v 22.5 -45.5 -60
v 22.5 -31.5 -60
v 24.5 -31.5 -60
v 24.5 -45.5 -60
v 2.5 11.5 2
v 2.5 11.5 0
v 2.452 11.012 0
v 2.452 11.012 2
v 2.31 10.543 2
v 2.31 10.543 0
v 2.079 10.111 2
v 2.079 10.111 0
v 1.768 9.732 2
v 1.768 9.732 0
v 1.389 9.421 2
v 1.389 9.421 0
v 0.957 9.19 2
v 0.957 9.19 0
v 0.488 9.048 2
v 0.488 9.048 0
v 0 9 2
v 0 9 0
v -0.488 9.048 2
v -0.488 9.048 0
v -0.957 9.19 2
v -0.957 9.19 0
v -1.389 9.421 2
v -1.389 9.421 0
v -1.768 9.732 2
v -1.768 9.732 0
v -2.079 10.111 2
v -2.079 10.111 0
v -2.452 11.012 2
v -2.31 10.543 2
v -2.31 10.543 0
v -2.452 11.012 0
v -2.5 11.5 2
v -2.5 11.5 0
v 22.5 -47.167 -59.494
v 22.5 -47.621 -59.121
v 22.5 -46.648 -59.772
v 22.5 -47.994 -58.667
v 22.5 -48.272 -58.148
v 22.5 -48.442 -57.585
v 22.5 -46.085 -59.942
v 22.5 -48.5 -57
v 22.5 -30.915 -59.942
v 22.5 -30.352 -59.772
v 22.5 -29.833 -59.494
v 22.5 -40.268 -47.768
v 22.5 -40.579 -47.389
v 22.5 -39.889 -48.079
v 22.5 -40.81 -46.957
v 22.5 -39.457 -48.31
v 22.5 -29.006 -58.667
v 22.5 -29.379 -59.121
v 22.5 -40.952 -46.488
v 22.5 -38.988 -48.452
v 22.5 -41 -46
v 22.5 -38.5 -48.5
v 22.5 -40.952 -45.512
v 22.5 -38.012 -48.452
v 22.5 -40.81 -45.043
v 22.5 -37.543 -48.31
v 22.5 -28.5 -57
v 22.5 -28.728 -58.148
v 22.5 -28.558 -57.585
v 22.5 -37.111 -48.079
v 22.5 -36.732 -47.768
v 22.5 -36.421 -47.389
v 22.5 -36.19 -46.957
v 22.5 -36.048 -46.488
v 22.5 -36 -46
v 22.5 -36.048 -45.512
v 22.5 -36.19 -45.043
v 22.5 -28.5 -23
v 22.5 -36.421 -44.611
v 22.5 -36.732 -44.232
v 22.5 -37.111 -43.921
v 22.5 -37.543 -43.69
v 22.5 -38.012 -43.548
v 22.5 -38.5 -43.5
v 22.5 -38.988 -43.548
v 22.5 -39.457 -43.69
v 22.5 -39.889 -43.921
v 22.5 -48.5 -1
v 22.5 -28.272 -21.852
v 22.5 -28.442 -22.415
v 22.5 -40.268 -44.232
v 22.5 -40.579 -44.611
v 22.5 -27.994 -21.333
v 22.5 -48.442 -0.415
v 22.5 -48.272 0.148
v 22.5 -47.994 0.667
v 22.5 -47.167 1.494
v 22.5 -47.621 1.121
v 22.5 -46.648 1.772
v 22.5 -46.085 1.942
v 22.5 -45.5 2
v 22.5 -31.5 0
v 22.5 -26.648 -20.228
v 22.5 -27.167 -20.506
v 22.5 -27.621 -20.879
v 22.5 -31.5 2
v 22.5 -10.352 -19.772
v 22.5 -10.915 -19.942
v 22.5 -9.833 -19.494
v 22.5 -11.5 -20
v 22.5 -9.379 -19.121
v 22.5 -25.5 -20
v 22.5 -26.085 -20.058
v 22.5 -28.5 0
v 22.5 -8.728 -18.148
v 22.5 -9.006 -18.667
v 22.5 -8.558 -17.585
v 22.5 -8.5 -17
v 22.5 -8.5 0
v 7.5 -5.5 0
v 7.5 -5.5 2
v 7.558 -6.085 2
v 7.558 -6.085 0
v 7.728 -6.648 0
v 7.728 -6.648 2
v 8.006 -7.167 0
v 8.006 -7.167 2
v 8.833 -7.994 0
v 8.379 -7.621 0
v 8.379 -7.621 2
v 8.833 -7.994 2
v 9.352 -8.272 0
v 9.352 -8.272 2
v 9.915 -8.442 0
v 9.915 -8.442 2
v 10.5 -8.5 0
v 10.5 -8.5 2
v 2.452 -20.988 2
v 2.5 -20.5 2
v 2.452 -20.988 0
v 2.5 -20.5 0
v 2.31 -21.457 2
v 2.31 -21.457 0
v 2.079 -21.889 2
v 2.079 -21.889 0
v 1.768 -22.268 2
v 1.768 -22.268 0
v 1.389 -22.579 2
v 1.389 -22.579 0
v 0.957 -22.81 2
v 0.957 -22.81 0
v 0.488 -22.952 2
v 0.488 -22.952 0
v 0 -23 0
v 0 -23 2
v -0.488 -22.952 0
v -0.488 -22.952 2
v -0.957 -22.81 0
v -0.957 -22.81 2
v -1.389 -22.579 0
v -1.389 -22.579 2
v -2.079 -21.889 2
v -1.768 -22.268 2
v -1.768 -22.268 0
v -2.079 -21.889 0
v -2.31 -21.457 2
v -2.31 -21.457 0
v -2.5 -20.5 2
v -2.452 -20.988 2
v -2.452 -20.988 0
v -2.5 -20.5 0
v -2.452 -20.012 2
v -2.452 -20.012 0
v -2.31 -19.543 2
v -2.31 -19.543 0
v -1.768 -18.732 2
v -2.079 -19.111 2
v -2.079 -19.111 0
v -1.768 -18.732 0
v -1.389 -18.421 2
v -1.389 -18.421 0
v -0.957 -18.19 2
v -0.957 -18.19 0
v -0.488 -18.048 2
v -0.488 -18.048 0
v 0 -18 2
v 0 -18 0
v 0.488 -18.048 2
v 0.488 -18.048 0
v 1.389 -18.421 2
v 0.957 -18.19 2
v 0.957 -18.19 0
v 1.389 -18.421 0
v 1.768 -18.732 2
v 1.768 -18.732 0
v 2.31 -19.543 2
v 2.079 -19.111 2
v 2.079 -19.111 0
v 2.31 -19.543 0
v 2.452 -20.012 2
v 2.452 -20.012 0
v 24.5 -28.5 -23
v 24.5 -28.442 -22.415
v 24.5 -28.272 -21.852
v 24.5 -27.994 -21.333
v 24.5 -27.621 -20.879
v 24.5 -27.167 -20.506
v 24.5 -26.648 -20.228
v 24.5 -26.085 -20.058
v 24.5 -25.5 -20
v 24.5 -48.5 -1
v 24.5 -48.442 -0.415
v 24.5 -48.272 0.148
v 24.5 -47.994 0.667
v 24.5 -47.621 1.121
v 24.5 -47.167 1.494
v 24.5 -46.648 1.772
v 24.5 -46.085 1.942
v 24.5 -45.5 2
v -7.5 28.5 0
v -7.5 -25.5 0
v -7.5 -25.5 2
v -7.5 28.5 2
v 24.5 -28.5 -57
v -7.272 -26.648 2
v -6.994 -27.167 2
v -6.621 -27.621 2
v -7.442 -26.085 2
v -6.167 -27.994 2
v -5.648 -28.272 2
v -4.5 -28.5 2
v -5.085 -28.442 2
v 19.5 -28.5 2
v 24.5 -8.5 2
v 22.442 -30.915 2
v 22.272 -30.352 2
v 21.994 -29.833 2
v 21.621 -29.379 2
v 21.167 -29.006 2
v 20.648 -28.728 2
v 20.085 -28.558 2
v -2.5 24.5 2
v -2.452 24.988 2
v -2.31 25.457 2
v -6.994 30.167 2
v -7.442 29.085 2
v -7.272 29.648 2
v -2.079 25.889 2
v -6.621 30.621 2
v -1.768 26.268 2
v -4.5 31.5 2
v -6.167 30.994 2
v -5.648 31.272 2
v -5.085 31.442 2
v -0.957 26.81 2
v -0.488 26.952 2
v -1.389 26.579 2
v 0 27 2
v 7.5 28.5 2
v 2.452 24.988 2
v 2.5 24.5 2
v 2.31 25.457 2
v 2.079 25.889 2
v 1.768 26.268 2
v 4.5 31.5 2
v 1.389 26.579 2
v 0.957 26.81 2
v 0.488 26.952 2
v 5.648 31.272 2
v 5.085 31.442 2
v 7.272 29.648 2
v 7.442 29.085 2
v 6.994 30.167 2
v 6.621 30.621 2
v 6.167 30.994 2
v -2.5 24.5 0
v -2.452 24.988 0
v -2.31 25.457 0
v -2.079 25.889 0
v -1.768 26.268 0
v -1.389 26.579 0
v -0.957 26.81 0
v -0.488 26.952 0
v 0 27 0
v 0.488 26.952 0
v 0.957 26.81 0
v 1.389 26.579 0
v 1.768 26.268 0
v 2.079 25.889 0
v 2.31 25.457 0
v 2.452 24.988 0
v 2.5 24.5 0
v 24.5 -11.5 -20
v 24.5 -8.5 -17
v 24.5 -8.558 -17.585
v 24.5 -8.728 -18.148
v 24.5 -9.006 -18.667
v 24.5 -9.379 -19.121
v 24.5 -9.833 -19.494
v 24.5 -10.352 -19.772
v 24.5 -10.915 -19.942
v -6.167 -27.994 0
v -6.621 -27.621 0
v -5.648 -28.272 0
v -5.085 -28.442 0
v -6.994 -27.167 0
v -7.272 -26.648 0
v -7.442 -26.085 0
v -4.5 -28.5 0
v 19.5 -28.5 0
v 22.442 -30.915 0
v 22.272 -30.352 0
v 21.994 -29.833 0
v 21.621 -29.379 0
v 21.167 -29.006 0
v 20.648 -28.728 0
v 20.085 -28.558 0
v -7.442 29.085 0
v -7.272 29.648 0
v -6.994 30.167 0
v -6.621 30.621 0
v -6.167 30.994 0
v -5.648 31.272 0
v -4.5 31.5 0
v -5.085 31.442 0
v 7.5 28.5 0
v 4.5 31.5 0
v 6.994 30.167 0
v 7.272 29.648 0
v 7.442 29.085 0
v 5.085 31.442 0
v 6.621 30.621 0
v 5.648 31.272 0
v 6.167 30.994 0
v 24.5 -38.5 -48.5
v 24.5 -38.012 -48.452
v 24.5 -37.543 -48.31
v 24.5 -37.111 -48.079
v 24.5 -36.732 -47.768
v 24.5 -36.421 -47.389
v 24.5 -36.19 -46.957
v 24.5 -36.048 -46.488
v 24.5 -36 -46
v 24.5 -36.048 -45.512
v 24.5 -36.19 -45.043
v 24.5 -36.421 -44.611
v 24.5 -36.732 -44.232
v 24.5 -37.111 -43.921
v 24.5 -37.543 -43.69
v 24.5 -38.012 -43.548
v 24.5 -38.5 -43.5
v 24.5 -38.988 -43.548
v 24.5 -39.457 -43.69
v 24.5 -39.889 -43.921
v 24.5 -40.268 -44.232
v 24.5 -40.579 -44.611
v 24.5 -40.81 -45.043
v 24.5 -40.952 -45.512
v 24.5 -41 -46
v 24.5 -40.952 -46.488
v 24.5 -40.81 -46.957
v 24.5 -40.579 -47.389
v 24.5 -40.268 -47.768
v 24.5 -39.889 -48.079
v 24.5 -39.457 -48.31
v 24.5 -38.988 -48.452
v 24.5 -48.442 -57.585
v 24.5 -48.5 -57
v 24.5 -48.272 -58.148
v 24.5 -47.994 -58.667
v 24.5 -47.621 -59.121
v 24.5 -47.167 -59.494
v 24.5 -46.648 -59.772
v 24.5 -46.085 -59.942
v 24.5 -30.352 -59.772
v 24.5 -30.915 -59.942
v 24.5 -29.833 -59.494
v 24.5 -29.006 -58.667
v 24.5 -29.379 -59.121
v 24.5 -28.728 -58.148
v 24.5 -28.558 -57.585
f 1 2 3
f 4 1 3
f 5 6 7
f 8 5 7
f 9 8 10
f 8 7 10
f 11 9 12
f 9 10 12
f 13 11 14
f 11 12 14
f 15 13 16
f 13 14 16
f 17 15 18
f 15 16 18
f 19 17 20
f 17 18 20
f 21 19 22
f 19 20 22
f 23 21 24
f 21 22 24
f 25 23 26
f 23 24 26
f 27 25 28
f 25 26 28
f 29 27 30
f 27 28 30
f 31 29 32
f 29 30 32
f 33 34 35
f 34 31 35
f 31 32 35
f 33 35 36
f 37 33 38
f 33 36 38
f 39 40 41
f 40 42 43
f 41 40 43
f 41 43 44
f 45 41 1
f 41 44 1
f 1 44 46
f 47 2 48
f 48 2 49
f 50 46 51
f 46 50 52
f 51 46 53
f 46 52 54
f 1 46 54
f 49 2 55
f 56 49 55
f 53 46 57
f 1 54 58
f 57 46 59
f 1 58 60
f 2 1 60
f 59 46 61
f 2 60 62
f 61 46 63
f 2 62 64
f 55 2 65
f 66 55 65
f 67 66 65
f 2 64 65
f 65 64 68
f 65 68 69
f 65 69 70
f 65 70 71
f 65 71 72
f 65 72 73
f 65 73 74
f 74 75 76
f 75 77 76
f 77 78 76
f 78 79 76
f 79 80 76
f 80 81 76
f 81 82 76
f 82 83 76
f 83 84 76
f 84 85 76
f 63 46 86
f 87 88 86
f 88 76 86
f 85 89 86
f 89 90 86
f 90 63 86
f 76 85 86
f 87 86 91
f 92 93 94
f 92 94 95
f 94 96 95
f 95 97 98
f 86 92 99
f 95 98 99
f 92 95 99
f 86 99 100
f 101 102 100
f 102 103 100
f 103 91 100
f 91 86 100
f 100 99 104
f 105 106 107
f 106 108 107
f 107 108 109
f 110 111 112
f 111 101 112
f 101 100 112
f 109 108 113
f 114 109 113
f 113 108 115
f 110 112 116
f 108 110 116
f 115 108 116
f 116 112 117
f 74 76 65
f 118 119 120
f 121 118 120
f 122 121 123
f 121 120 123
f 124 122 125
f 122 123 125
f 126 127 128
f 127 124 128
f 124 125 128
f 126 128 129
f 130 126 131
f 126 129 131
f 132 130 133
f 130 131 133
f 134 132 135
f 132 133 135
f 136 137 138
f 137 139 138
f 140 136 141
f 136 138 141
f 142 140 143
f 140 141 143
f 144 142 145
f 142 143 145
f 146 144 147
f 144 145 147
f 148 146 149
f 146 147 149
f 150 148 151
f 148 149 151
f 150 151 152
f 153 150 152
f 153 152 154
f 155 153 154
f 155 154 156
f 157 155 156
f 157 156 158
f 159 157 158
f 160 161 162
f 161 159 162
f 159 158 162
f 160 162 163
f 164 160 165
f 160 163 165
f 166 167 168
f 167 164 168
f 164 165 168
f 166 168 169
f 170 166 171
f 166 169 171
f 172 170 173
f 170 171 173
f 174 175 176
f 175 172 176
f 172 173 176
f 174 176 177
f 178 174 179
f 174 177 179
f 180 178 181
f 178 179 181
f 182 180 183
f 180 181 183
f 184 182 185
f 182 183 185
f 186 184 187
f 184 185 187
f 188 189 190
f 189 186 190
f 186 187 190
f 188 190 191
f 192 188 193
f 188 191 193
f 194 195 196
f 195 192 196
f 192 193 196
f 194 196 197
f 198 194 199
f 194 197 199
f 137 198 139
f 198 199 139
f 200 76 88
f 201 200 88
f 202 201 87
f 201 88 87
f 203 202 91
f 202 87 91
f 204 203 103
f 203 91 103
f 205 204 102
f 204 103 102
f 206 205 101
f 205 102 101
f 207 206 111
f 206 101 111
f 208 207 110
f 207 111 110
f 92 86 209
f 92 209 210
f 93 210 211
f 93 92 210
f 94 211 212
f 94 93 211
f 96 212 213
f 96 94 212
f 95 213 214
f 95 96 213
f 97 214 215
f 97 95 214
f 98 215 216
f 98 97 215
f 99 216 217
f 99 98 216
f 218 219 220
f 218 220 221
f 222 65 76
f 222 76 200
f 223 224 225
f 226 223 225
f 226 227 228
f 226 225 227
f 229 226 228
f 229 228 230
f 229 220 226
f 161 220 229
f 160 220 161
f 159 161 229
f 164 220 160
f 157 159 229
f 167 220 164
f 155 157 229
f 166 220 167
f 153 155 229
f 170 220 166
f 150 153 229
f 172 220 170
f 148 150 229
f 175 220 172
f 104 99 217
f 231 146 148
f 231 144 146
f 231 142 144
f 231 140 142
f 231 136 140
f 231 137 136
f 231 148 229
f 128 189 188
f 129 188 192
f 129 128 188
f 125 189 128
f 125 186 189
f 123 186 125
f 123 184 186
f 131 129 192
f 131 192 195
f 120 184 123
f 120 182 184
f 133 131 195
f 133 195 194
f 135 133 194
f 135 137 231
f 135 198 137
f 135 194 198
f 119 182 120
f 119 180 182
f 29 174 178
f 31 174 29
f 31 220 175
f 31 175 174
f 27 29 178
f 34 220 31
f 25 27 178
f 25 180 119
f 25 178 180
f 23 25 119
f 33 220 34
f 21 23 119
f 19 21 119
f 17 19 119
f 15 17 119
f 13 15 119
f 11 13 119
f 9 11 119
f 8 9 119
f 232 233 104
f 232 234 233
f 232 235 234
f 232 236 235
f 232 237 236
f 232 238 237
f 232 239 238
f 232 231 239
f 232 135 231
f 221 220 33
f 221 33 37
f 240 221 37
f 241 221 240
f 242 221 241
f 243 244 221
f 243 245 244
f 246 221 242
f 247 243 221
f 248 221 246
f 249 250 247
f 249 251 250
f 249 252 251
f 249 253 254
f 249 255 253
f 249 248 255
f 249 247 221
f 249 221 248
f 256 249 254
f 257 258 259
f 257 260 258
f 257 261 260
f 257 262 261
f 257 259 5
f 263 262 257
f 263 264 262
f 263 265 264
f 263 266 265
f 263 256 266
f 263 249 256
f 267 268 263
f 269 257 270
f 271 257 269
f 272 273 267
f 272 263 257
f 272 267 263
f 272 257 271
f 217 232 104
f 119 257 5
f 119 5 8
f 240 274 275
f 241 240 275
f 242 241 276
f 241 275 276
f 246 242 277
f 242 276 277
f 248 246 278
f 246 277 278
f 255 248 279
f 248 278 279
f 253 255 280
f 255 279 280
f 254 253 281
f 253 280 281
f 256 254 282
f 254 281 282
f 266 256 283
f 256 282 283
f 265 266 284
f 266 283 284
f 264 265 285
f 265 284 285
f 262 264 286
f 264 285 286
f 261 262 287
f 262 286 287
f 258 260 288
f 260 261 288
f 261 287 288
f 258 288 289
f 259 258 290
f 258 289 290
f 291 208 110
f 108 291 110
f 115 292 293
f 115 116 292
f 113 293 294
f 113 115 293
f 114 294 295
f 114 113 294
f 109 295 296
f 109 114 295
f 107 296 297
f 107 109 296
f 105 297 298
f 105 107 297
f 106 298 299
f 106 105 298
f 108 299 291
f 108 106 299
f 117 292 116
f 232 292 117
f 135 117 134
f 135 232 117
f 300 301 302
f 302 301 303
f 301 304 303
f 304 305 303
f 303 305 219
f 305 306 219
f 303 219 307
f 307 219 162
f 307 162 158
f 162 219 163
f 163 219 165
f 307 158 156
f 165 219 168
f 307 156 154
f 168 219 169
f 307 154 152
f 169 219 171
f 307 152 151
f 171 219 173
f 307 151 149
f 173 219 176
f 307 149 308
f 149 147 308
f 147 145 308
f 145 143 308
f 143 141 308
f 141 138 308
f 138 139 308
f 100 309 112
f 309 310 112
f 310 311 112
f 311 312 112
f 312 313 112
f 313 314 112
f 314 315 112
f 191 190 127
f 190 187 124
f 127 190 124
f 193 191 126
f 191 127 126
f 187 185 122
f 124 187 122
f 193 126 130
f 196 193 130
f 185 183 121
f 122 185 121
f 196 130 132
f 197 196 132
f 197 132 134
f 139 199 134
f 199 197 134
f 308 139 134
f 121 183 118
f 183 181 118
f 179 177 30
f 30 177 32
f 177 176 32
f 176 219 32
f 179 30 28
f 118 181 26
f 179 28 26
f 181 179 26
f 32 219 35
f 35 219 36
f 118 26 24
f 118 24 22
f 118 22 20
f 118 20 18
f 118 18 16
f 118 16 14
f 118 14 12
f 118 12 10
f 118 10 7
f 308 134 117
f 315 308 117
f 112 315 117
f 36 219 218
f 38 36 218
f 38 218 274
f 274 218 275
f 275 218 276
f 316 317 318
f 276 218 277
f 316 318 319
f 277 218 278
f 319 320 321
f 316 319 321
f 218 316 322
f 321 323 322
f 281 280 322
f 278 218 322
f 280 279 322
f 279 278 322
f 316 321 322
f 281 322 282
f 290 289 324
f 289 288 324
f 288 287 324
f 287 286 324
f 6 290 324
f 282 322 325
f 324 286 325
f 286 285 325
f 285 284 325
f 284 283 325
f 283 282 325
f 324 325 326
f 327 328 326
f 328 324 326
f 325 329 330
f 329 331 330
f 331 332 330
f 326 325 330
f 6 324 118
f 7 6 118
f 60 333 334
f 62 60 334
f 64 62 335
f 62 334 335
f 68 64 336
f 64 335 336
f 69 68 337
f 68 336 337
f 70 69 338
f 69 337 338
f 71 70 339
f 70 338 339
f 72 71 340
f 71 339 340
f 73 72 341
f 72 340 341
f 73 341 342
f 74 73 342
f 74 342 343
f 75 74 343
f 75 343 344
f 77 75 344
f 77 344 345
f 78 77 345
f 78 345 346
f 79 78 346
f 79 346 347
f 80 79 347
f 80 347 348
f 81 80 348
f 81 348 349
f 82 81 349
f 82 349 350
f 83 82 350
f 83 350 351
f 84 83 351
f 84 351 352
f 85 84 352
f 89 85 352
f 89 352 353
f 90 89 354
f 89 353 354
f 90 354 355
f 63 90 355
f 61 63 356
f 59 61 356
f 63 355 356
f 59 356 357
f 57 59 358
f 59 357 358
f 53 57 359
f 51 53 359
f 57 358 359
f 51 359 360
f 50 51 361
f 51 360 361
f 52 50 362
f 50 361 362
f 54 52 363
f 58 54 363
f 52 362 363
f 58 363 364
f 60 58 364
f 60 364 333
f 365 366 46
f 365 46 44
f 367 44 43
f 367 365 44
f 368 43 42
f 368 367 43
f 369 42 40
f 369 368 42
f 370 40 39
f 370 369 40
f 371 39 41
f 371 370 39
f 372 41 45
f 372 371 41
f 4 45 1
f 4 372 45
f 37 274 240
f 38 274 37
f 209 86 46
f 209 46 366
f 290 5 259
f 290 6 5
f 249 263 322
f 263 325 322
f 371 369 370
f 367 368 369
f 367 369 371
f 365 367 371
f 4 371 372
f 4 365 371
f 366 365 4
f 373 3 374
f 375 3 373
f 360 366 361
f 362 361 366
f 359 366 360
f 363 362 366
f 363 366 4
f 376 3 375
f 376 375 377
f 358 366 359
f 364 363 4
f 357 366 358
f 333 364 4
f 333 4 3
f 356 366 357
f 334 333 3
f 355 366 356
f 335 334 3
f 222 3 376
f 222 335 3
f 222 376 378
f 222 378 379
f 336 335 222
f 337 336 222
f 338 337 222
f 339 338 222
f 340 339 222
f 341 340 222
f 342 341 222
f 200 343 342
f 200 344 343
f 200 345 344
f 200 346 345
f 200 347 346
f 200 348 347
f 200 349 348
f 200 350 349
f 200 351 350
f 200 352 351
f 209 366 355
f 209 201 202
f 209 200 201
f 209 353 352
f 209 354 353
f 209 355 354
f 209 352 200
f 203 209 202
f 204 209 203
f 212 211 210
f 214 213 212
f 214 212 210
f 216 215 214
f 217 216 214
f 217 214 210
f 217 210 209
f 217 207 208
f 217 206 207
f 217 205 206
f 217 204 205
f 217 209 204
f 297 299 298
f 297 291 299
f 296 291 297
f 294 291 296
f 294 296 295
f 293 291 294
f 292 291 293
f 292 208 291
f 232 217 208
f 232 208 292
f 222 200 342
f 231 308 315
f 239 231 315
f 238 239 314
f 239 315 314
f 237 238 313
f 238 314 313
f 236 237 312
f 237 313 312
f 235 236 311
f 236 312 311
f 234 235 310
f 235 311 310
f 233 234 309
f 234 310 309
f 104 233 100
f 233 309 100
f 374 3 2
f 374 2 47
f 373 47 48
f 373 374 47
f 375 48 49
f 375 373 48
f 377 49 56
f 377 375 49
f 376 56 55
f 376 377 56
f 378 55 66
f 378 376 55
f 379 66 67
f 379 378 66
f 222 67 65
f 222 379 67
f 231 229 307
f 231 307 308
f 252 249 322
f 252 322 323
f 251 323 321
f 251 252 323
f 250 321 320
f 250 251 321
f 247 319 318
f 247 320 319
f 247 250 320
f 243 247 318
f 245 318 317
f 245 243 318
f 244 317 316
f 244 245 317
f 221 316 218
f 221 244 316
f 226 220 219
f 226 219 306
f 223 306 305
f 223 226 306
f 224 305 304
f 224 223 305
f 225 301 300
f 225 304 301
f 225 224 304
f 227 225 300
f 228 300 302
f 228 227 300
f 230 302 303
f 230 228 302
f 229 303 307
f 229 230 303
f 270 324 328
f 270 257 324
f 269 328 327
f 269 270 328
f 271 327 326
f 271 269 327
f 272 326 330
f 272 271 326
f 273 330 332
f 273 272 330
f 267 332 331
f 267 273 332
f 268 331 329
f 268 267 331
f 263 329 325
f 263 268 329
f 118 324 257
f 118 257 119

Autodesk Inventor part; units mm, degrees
ref_plane "YZ Plane" through (0, 0, 0) normal (1, 0, 0) x (0, 1, 0)
ref_plane "XZ Plane" through (0, 0, 0) normal (0, 1, 0) x (-1, 0, 0)
ref_plane "XY Plane" through (0, 0, 0) normal (0, 0, 1) x (1, 0, 0)
sketch "Sketch1" plane through (0, 0, 0) normal (0, 0, 1) x (1, 0, 0)
  line L0 (7.5, -28.5) -> (-7.5, -28.5)
  line L1 (-7.5, -28.5) -> (-7.5, 28.5)
  line L2 (-7.5, 28.5) -> (7.5, -28.5) construction
  line L3 (7.5, 28.5) -> (-7.5, -28.5) construction
  circle A0 centre (0, -20.5) radius 2.5
  line L4 (0, 24.5) -> (0, 11.5) construction
  line L5 (-2.5, 24.5) -> (-2.5, 11.5)
  line L6 (2.5, 11.5) -> (2.5, 24.5)
  arc A1 (2.5, 24.5) -> (-2.5, 24.5) centre (0, 24.5) ccw
  arc A2 (-2.5, 11.5) -> (2.5, 11.5) centre (0, 11.5) ccw
  line L7 (7.5, 31.5) -> (-7.5, 31.5)
  line L8 (-7.5, 31.5) -> (-7.5, -28.5)
  line L9 (7.5, 31.5) -> (7.5, -28.5)
  line L10 (7.5, -8.5) -> (7.5, -28.5)
  line L11 (7.5, -28.5) -> (22.5, -28.5)
  line L12 (22.5, -28.5) -> (22.5, -8.5)
  line L13 (22.5, -8.5) -> (7.5, -8.5)
  line L14 (7.5, -8.5) -> (7.5, -28.5)
  line L15 (22.5, -28.5) -> (24.5, -28.5)
  line L16 (24.5, -28.5) -> (24.5, -8.5)
  line L17 (24.5, -8.5) -> (22.5, -8.5)
  line L18 (22.5, -8.5) -> (22.5, -28.5)
  point P0 (0, 0)
  point P1 (0, 18)
  dimension "d7" = 15
  dimension "d8" = 57
  dimension "d9" = 5
  dimension "d10" = 13
  dimension "d11" = 5
  dimension "d12" = 60
  dimension "d39" = 15
  dimension "d40" = 20
  dimension "d41" = 2
extrude "Extrusion1" add sketch "Sketch1" along normal blind 2 contours L0 L1 L8 L7 L9
extrude "Extrusion2" add sketch "Sketch1" along normal blind 2 contours L9 L13 L12 L11 | L12 L17 L16 L15
extrude "Extrusion8" add sketch "Sketch1" against normal blind 60 contours L12 L17 L16 L15
sketch "Sketch6" plane through (-7.5, -28.5, 0) normal (0, -1, 0) x (1, 0, 0)
  line L0 (32, -60) -> (32, 2) projected
  line L1 (30, 0) -> (30, -60) projected
  line L2 (32, 2) -> (30, 2)
  line L3 (30, 2) -> (30, -60)
  line L4 (30, -60) -> (32, -60)
  line L5 (32, -60) -> (32, 2)
  line L6 (30, -60) -> (32, -60)
  line L7 (32, -60) -> (32, -20)
  line L8 (32, -20) -> (30, -20)
  line L9 (30, -20) -> (30, -60)
  point P0 (7.5, 0)
  dimension "d51" = 40
extrude "Extrusion9" cut sketch "Sketch6" against normal blind 20 contours L4 L1 L8 L0
extrude "Extrusion11" add sketch "Sketch6" along normal blind 20
sketch "Sketch8" plane through (24.5, -8.5, 2) normal (1, 0, 0) x (0, 0, -1)
  circle A0 centre (48, -30) radius 2.5
  point P0 (2, 8.5)
  dimension "d54" = 5
extrude "Extrusion12" cut sketch "Sketch8" against normal up to surface (2 mm away)
fillet "Fillet1" radius 3 10 edges at (23.5, -48.5, 2) (23.5, -8.5, -20) (23.5, -28.5, -20) (23.5, -28.5, -60) (23.5, -48.5, -60) (7.5, -8.5, 1) (22.5, -28.5, 1) (-7.5, -28.5, 1) (7.5, 31.5, 1) (-7.5, 31.5, 1)
properties part number "Rectangle_plate[1]"
